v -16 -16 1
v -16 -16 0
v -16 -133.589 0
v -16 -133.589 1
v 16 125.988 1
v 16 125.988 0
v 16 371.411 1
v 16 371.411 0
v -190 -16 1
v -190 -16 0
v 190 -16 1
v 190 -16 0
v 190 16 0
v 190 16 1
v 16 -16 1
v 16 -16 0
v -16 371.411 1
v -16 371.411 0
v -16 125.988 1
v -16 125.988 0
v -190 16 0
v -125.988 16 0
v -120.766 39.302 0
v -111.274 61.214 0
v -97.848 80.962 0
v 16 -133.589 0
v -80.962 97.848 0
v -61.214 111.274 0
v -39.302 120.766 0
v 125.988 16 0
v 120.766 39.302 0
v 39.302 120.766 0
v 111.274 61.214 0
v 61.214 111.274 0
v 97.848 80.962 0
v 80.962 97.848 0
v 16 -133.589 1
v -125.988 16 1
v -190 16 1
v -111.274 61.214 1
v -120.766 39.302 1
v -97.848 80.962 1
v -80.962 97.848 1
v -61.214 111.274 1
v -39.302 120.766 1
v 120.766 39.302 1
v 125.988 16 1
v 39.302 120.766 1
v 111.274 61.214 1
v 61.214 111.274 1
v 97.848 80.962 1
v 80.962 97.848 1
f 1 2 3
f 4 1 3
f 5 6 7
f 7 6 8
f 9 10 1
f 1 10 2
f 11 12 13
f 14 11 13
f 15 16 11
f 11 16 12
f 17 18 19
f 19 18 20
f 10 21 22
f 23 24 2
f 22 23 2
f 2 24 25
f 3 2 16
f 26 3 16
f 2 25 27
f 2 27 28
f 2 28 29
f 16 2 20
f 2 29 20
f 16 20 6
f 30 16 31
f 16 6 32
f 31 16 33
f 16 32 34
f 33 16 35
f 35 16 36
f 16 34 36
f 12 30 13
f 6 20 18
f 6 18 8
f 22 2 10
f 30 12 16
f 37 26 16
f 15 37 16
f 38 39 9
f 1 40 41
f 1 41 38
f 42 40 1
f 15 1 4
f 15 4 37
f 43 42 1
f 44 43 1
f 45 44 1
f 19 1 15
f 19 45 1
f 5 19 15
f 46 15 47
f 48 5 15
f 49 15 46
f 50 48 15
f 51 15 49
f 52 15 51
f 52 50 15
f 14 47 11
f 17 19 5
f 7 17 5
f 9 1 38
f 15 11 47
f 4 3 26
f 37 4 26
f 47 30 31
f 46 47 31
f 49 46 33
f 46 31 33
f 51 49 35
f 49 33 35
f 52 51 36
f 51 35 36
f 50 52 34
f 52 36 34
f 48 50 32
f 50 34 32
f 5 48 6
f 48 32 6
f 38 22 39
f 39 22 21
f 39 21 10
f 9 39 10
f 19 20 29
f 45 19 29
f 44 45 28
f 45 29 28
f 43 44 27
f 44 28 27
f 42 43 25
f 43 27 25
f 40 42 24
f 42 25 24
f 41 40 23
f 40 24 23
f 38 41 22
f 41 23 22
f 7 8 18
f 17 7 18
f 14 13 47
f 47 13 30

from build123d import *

# Parameters (mm, degrees)
F1_DEPTH = 1


with BuildPart() as f1:
    # F0 (on Top) → F1 (new body)
    with BuildSketch(Plane.XY):
        with BuildLine():
            ThreePointArc((-16, 125.988095), (-89.802561, 89.802561), (-125.988095, 16))
            Line((-125.988095, 16), (-190, 16))
            Line((-190, 16), (-190, 0))
            Line((-190, 0), (-190, -16))
            Line((-190, -16), (-16, -16))
            Line((-16, -16), (-16, -133.589491))
            Line((-16, -133.589491), (0, -133.589491))
            Line((0, -133.589491), (16, -133.589491))
            Line((16, -133.589491), (16, -16))
            Line((16, -16), (190, -16))
            Line((190, -16), (190, 0))
            Line((190, 0), (190, 16))
            Line((190, 16), (125.988095, 16))
            ThreePointArc((125.988095, 16), (89.802561, 89.802561), (16, 125.988095))
            Line((16, 125.988095), (16, 371.410509))
            Line((16, 371.410509), (0, 371.410509))
            Line((0, 371.410509), (-16, 371.410509))
            Line((-16, 371.410509), (-16, 125.988095))
        make_face()
    extrude(amount=F1_DEPTH)


solid = f1.part
